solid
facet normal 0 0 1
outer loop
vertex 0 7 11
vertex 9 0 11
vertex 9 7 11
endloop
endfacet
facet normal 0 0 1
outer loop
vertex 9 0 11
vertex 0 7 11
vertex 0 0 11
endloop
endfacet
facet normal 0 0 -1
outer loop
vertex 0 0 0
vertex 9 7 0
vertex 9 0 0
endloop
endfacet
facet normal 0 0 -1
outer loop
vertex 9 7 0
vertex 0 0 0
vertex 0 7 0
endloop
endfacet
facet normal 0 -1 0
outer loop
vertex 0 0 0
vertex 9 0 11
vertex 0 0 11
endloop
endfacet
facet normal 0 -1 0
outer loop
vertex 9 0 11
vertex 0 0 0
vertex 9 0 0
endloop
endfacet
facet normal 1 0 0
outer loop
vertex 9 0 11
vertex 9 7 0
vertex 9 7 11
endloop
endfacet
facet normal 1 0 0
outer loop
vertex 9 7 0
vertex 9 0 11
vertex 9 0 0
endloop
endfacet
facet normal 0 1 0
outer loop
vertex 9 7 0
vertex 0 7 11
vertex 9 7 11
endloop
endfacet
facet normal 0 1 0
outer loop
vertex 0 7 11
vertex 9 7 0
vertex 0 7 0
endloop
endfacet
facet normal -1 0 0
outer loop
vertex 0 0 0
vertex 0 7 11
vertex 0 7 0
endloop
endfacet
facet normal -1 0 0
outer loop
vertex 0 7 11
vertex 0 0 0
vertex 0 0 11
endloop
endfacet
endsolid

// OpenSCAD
// Generated by SolidPython 1.0.1 on 2020-07-29 00:46:55


cube(size = [9, 7, 11]);
/***********************************************
*********      SolidPython code:      **********
************************************************
 
# import packages: SolidPython
from solid import *
from solid.utils import *
from itertools import chain, combinations, permutations


class Resize:

    def __init__(self, scad_file):
        self.scad_file = scad_file
        #self.scad_file = import_scad(scad_file)
        # cone/cylinder param:
        self.r1 = 0
        self.r2 = 0
        self.h = 0
        # rectangular prism param:
        self.w = 0
        self.l = 0
        # ellipse param:
        self.r = 0

    # import OpenScad code (file name corresponds to shape)


    # classify shape + parameters
    def assign(self, param1, param2, param3):
        if self.scad_file == 'cone.scad':
            self.r1 = param1
            self.r2 = param2
            self.h = param3
        elif self.scad_file == 'cylinder.scad':
            self.r1 = param1
            self.r2 = param2
            self.h = param3
        elif self.scad_file == 'rectangularPrism.scad':
            self.h = param1
            self.l = param2
            self.w = param3
        else:
            self.r = param1
            self.h = param2

    # resize parameters
    def iterate(self):
        x = range(3, 20, 2)
        i = 1
        if self.scad_file == 'cone.scad':
            tempList = list(permutations(x, 2))
            for temp in tempList:
                param1 = temp[0]
                param2 = temp[1]
                filepath = 'produced_scad_files/' + 'cone' + str(param1) + '_' + str(param2) + '_' + '.scad'
                scad_render_to_file(cylinder(h=param1, r1=param2, r2=0), filepath)

        elif self.scad_file == 'cylinder.scad':
            tempList = list(permutations(x, 3))
            for temp in tempList:
                param1 = temp[0]
                param2 = temp[1]
                filepath = 'produced_scad_files/' + 'cylinder' + str(param1) + '_' + str(param2) + '_' + '.scad'
                scad_render_to_file(cylinder(h=param1, r1=param2, r2=param2), filepath)

        elif self.scad_file == 'rectangularPrism.scad':
            tempList = list(permutations(x, 3))
            for temp in tempList:
                param1 = temp[0]
                param2 = temp[1]
                param3 = temp[2]
                filepath = 'produced_scad_files/' + 'rectangularPrism' + str(param1) + '_' + str(param2) + '_' + str(
                    param3) + '.scad'
                scad_render_to_file(cube(size=(param1, param2, param3)), filepath)

        elif self.scad_file == 'ellipse.scad':
            tempList = list(permutations(x, 4))
            for temp in tempList:
                param1 = temp[0]
                param2 = temp[1]
                param3 = temp[2]
                param4 = temp[3]
                filepath = 'produced_scad_files/' + 'ellipse' + str(param1) + '_' + str(param2) + '_' + str(param3) + '_' + str(param4) + '.scad'
                scad_render_to_file(scale([param1, param2, param3])(sphere(r=param4)), filepath)

    def render_to_scadfile(self):
        scad_render_to_file(scad, 'example.scad') 
 
************************************************/
